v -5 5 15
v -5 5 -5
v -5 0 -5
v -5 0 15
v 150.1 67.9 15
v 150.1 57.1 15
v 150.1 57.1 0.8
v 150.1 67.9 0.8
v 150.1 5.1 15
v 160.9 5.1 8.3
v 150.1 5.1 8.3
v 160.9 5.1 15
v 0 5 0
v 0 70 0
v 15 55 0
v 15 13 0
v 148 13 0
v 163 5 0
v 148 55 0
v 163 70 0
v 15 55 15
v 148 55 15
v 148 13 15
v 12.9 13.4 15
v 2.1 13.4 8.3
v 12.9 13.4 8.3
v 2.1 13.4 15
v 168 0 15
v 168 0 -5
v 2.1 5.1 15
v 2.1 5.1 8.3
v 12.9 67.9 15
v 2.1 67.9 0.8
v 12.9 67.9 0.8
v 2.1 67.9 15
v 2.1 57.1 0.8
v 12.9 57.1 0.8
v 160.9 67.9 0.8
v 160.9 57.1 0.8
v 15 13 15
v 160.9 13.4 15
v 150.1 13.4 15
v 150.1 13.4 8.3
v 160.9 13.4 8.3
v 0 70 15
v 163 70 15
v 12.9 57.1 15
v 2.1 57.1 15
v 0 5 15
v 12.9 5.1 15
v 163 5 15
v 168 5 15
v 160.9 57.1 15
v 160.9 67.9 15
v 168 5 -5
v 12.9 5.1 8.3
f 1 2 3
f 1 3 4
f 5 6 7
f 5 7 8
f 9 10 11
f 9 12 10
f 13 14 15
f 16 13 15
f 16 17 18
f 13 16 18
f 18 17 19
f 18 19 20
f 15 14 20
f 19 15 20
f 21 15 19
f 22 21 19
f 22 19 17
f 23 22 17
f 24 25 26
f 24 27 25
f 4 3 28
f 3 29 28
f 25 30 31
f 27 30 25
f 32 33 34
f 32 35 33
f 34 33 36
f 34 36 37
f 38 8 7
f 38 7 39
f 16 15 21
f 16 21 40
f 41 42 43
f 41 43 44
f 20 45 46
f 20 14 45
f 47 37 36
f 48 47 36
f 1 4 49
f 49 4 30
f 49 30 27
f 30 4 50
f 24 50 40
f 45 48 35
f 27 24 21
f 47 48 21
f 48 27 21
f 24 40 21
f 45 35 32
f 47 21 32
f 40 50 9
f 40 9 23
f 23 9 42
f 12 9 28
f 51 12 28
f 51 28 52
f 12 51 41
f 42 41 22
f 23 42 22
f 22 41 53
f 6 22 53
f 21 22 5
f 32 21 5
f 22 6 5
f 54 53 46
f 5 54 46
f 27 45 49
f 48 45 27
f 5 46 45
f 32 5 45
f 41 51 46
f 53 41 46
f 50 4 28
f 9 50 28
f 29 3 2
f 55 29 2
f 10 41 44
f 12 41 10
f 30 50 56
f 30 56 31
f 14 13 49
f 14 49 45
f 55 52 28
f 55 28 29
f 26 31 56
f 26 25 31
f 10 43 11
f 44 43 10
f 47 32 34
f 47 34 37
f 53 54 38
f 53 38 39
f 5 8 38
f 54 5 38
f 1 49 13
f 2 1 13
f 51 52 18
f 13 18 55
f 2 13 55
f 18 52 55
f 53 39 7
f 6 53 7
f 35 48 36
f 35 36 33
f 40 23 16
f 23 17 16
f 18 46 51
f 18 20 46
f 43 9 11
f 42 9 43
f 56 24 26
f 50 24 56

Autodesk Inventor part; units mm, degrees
ref_plane "YZ Plane" through (0, 0, 0) normal (1, 0, 0) x (0, 1, 0)
ref_plane "XZ Plane" through (0, 0, 0) normal (0, 1, 0) x (-1, 0, 0)
ref_plane "XY Plane" through (0, 0, 0) normal (0, 0, 1) x (1, 0, 0)
sketch "Sketch1" plane through (0, 0, 0) normal (0, 0, 1) x (1, 0, 0)
  line L0 (0, 0) -> (0, 70)
  line L1 (0, 70) -> (163, 70)
  line L2 (163, 70) -> (163, 0)
  line L3 (163, 0) -> (0, 0)
  line L4 (0, 70) -> (15, 70)
  line L5 (15, 55) -> (15, 13)
  line L6 (0, 70) -> (0, 55)
  line L7 (15, 55) -> (148, 55)
  line L8 (163, 70) -> (148, 70)
  line L9 (148, 55) -> (148, 13)
  line L10 (163, 0) -> (163, 13)
  line L11 (148, 13) -> (15, 13)
  dimension "d0" = 70
  dimension "d1" = 163
  dimension "d2" = 15
  dimension "d3" = 15
  dimension "d4" = 15
  dimension "d5" = 13
extrude "Extrusion1" add sketch "Sketch1" along normal blind 15
sketch "Sketch2" plane through (0, 0, 0) normal (0, 0, -1) x (-1, 0, 0)
  line L0 (-163, 0) -> (-163, 70) projected
  line L1 (-163, 0) -> (-163, 5)
  line L2 (-163, 5) -> (0, 5)
  line L3 (0, 0) -> (-163, 0) projected
  line L4 (-163, 0) -> (0, 0)
  line L5 (-163, 0) -> (0, 0)
  line L6 (0, 0) -> (0, 5)
  line L7 (0, 5) -> (-163, 5)
  line L8 (-163, 5) -> (-163, 0)
  dimension "d8" = 5
extrude "Extrusion2" add sketch "Sketch2" along normal blind 5
sketch "Sketch3" plane through (163, 0, 15) normal (1, 0, 0) x (0, 0, -1)
  line L0 (20, 5) -> (20, 0) projected
  line L1 (0, 0) -> (20, 0)
  line L2 (20, 0) -> (20, 5)
  line L3 (20, 5) -> (0, 5)
  line L4 (0, 5) -> (0, 0)
  point P0 (15, 0)
extrude "Extrusion3" add sketch "Sketch3" along normal blind 5
ref_plane "Work Plane1" through (81.5, 70, 15) normal (1, 0, 0) x (0, 0, -1)
mirror "Mirror1" about plane through (81.5, 70, 15) normal (1, 0, 0) of "Extrusion3"
sketch "Sketch4" plane through (0, 0, 15) normal (0, 0, 1) x (1, 0, 0)
  line L0 (163, 70) -> (0, 70) projected
  line L1 (15, 55) -> (148, 55) projected
  line L2 (0, 70) -> (2.5003, 67.4997) construction
  line L3 (2.5003, 67.4997) -> (2.5003, 57.4997)
  line L4 (2.5003, 57.4997) -> (12.5003, 57.4997)
  line L5 (12.5003, 57.4997) -> (12.5003, 67.4997)
  line L6 (12.5003, 67.4997) -> (2.5003, 67.4997)
  line L7 (148, 13) -> (15, 13) projected
  line L8 (15, 13) -> (12.5, 13) construction
  line L9 (12.5, 13) -> (2.5, 13)
  line L10 (2.5, 13) -> (2.5, 5.5)
  line L11 (2.5, 5.5) -> (12.5, 5.5)
  line L12 (12.5, 5.5) -> (12.5, 13)
  line L13 (2.1, 13.4) -> (12.9, 13.4)
  line L14 (12.9, 13.4) -> (12.9, 5.1)
  line L15 (12.9, 5.1) -> (2.1, 5.1)
  line L16 (2.1, 5.1) -> (2.1, 13.4)
  line L17 (12.9003, 57.0997) -> (2.1003, 57.0997)
  line L18 (2.1003, 57.0997) -> (2.1003, 67.8997)
  line L19 (2.1003, 67.8997) -> (12.9003, 67.8997)
  line L20 (12.9003, 67.8997) -> (12.9003, 57.0997)
  point P0 (0, 0)
  dimension "d13" = 3.536
  dimension "d14" = 10
  dimension "d15" = 10
  dimension "d16" = 10
  dimension "d17" = 2.5
  dimension "d18" = 10
  dimension "d19" = 7.5
  dimension "d20" = 10
  dimension "d22" = 0.4
  dimension "d23" = 0.4
extrude "Extrusion4" cut sketch "Sketch4" against normal blind 6.7 contours L12 L11 L10 L9 | L13 L14 L15 L16
extrude "Extrusion5" cut sketch "Sketch4" against normal blind 14.2 contours L6 L5 L4 L3 | L17 L18 L19 L20
mirror "Mirror2" about plane through (81.5, 70, 15) normal (1, 0, 0) of "Extrusion4", "Extrusion5"
properties part number "Front Facing Beam Support"
